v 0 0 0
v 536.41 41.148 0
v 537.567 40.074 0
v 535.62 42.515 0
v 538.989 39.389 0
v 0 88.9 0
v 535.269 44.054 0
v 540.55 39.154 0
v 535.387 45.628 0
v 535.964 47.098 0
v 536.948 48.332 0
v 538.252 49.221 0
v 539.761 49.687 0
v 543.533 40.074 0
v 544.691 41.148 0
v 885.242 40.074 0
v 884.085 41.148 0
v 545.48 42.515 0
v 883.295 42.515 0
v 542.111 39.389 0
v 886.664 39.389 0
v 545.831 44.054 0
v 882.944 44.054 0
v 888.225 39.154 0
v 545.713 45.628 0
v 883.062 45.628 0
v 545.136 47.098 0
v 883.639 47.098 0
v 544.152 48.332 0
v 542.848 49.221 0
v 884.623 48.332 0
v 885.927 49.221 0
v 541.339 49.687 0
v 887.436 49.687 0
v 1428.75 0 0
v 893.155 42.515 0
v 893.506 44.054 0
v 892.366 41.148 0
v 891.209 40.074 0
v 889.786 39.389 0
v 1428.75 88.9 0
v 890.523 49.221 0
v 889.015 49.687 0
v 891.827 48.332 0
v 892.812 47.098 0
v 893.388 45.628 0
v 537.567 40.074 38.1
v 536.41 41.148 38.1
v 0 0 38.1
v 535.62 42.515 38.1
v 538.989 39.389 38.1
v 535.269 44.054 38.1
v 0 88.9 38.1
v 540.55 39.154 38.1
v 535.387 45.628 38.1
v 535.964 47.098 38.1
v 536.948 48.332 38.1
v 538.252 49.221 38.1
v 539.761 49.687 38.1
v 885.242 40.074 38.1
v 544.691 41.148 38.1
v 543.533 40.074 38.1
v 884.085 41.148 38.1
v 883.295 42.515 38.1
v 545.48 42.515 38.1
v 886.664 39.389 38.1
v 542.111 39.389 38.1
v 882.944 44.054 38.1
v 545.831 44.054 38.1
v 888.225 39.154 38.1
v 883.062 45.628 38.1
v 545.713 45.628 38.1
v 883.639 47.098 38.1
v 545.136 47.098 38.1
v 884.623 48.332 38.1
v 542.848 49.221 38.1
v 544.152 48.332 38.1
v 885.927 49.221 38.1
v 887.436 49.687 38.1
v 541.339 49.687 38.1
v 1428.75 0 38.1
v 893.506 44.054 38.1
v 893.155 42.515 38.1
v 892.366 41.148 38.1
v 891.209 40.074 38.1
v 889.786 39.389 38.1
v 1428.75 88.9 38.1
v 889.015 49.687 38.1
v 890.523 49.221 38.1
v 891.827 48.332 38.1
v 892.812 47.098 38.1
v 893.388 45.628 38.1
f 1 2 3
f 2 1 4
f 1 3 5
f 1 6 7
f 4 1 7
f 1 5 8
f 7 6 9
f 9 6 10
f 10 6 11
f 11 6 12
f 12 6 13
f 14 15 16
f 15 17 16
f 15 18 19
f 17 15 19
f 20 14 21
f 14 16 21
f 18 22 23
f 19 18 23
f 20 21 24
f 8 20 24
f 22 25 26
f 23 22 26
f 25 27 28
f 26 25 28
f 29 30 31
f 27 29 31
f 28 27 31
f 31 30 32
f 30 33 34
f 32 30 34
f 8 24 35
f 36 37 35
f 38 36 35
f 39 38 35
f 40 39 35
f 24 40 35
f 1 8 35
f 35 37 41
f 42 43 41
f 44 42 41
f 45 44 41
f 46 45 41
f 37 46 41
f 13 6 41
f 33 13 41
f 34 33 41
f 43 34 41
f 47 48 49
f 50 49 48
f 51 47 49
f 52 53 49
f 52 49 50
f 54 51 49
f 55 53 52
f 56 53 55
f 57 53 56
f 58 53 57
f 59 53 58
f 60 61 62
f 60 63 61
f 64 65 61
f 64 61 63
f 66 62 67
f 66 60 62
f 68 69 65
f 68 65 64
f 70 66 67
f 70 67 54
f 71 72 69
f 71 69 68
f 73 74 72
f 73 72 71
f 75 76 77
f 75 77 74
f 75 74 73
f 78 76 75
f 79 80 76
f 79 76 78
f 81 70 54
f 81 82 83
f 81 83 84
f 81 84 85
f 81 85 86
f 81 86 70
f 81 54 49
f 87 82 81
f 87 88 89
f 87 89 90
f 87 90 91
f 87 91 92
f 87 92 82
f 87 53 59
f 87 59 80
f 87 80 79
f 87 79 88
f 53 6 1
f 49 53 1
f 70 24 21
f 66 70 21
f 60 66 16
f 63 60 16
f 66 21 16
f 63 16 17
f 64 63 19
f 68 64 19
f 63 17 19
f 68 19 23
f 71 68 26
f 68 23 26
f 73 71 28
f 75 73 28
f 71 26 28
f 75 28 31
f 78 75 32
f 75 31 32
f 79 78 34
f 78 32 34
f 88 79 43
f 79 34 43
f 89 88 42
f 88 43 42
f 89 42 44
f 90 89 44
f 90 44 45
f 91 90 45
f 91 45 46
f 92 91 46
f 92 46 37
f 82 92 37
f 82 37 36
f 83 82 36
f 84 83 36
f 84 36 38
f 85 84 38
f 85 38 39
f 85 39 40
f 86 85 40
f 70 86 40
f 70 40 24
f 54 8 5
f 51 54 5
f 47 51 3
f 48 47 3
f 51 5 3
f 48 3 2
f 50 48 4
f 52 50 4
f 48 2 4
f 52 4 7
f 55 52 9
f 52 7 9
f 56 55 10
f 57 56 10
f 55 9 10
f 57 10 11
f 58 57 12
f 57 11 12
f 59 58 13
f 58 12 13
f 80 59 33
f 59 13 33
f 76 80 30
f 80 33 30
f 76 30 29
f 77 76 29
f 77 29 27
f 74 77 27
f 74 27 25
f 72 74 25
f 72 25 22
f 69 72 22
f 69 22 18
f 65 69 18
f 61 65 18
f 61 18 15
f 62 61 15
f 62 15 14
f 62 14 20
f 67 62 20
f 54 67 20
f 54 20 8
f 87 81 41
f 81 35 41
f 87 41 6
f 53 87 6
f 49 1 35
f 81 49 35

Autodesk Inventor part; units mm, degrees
ref_plane "YZ Plane" through (0, 0, 0) normal (1, 0, 0) x (0, 1, 0)
ref_plane "XZ Plane" through (0, 0, 0) normal (0, 1, 0) x (-1, 0, 0)
ref_plane "XY Plane" through (0, 0, 0) normal (0, 0, 1) x (1, 0, 0)
sketch "Sketch1" plane through (0, 0, 0) normal (0, 0, 1) x (1, 0, 0)
  line L0 (0, 0) -> (1428.75, 0)
  line L1 (1428.75, 0) -> (1428.75, 88.9)
  line L2 (1428.75, 88.9) -> (0, 88.9)
  line L3 (0, 88.9) -> (0, 0)
  dimension "d0" = 1428.75
  dimension "d1" = 88.9
extrude "Extrusion1" add sketch "Sketch1" along normal blind 38.1
sketch "Sketch2" plane through (0, 0, 38.1) normal (0, 0, 1) x (1, 0, 0)
  line L0 (0, 88.9) -> (0, 0)
  line L1 (38.1, 88.9) -> (38.1, 0)
  line L2 (347.6625, 88.9) -> (347.6625, 0)
  line L3 (385.7625, 88.9) -> (385.7625, 0)
  line L4 (695.3377, 88.9) -> (695.3377, 0)
  line L5 (733.4377, 88.9) -> (733.4377, 0)
  line L6 (1043.0002, 88.9) -> (1043.0002, 0)
  line L7 (1081.1002, 88.9) -> (1081.1002, 0)
  line L8 (1390.6627, 88.9) -> (1390.6627, 0)
  line L9 (1428.7627, 88.9) -> (1428.7627, 0)
  line L10 (733.4377, 44.45) -> (888.2253, 44.45)
  line L11 (695.3377, 44.45) -> (540.5501, 44.45)
  dimension "d4" = 38.1
  dimension "d5" = 309.5625
  dimension "d6" = 38.1
  dimension "d7" = 309.5752
  dimension "d8" = 38.1
  dimension "d9" = 309.5625
  dimension "d10" = 38.1
  dimension "d11" = 309.5625
  dimension "d12" = 38.1
  dimension "d63" = 154.7876
  dimension "d64" = 154.7876
hole "Hole3" at (540.5501, 44.45, 38.1) at (888.2253, 44.45, 38.1) direction (0, 0, -1) diameter 10.5918 end through all thread size "1/2-13 UNC" class "2B" standard "ANSI Unified Screw Threads"
properties part number "56.25in 2x4" material "Pine, Radiata"
